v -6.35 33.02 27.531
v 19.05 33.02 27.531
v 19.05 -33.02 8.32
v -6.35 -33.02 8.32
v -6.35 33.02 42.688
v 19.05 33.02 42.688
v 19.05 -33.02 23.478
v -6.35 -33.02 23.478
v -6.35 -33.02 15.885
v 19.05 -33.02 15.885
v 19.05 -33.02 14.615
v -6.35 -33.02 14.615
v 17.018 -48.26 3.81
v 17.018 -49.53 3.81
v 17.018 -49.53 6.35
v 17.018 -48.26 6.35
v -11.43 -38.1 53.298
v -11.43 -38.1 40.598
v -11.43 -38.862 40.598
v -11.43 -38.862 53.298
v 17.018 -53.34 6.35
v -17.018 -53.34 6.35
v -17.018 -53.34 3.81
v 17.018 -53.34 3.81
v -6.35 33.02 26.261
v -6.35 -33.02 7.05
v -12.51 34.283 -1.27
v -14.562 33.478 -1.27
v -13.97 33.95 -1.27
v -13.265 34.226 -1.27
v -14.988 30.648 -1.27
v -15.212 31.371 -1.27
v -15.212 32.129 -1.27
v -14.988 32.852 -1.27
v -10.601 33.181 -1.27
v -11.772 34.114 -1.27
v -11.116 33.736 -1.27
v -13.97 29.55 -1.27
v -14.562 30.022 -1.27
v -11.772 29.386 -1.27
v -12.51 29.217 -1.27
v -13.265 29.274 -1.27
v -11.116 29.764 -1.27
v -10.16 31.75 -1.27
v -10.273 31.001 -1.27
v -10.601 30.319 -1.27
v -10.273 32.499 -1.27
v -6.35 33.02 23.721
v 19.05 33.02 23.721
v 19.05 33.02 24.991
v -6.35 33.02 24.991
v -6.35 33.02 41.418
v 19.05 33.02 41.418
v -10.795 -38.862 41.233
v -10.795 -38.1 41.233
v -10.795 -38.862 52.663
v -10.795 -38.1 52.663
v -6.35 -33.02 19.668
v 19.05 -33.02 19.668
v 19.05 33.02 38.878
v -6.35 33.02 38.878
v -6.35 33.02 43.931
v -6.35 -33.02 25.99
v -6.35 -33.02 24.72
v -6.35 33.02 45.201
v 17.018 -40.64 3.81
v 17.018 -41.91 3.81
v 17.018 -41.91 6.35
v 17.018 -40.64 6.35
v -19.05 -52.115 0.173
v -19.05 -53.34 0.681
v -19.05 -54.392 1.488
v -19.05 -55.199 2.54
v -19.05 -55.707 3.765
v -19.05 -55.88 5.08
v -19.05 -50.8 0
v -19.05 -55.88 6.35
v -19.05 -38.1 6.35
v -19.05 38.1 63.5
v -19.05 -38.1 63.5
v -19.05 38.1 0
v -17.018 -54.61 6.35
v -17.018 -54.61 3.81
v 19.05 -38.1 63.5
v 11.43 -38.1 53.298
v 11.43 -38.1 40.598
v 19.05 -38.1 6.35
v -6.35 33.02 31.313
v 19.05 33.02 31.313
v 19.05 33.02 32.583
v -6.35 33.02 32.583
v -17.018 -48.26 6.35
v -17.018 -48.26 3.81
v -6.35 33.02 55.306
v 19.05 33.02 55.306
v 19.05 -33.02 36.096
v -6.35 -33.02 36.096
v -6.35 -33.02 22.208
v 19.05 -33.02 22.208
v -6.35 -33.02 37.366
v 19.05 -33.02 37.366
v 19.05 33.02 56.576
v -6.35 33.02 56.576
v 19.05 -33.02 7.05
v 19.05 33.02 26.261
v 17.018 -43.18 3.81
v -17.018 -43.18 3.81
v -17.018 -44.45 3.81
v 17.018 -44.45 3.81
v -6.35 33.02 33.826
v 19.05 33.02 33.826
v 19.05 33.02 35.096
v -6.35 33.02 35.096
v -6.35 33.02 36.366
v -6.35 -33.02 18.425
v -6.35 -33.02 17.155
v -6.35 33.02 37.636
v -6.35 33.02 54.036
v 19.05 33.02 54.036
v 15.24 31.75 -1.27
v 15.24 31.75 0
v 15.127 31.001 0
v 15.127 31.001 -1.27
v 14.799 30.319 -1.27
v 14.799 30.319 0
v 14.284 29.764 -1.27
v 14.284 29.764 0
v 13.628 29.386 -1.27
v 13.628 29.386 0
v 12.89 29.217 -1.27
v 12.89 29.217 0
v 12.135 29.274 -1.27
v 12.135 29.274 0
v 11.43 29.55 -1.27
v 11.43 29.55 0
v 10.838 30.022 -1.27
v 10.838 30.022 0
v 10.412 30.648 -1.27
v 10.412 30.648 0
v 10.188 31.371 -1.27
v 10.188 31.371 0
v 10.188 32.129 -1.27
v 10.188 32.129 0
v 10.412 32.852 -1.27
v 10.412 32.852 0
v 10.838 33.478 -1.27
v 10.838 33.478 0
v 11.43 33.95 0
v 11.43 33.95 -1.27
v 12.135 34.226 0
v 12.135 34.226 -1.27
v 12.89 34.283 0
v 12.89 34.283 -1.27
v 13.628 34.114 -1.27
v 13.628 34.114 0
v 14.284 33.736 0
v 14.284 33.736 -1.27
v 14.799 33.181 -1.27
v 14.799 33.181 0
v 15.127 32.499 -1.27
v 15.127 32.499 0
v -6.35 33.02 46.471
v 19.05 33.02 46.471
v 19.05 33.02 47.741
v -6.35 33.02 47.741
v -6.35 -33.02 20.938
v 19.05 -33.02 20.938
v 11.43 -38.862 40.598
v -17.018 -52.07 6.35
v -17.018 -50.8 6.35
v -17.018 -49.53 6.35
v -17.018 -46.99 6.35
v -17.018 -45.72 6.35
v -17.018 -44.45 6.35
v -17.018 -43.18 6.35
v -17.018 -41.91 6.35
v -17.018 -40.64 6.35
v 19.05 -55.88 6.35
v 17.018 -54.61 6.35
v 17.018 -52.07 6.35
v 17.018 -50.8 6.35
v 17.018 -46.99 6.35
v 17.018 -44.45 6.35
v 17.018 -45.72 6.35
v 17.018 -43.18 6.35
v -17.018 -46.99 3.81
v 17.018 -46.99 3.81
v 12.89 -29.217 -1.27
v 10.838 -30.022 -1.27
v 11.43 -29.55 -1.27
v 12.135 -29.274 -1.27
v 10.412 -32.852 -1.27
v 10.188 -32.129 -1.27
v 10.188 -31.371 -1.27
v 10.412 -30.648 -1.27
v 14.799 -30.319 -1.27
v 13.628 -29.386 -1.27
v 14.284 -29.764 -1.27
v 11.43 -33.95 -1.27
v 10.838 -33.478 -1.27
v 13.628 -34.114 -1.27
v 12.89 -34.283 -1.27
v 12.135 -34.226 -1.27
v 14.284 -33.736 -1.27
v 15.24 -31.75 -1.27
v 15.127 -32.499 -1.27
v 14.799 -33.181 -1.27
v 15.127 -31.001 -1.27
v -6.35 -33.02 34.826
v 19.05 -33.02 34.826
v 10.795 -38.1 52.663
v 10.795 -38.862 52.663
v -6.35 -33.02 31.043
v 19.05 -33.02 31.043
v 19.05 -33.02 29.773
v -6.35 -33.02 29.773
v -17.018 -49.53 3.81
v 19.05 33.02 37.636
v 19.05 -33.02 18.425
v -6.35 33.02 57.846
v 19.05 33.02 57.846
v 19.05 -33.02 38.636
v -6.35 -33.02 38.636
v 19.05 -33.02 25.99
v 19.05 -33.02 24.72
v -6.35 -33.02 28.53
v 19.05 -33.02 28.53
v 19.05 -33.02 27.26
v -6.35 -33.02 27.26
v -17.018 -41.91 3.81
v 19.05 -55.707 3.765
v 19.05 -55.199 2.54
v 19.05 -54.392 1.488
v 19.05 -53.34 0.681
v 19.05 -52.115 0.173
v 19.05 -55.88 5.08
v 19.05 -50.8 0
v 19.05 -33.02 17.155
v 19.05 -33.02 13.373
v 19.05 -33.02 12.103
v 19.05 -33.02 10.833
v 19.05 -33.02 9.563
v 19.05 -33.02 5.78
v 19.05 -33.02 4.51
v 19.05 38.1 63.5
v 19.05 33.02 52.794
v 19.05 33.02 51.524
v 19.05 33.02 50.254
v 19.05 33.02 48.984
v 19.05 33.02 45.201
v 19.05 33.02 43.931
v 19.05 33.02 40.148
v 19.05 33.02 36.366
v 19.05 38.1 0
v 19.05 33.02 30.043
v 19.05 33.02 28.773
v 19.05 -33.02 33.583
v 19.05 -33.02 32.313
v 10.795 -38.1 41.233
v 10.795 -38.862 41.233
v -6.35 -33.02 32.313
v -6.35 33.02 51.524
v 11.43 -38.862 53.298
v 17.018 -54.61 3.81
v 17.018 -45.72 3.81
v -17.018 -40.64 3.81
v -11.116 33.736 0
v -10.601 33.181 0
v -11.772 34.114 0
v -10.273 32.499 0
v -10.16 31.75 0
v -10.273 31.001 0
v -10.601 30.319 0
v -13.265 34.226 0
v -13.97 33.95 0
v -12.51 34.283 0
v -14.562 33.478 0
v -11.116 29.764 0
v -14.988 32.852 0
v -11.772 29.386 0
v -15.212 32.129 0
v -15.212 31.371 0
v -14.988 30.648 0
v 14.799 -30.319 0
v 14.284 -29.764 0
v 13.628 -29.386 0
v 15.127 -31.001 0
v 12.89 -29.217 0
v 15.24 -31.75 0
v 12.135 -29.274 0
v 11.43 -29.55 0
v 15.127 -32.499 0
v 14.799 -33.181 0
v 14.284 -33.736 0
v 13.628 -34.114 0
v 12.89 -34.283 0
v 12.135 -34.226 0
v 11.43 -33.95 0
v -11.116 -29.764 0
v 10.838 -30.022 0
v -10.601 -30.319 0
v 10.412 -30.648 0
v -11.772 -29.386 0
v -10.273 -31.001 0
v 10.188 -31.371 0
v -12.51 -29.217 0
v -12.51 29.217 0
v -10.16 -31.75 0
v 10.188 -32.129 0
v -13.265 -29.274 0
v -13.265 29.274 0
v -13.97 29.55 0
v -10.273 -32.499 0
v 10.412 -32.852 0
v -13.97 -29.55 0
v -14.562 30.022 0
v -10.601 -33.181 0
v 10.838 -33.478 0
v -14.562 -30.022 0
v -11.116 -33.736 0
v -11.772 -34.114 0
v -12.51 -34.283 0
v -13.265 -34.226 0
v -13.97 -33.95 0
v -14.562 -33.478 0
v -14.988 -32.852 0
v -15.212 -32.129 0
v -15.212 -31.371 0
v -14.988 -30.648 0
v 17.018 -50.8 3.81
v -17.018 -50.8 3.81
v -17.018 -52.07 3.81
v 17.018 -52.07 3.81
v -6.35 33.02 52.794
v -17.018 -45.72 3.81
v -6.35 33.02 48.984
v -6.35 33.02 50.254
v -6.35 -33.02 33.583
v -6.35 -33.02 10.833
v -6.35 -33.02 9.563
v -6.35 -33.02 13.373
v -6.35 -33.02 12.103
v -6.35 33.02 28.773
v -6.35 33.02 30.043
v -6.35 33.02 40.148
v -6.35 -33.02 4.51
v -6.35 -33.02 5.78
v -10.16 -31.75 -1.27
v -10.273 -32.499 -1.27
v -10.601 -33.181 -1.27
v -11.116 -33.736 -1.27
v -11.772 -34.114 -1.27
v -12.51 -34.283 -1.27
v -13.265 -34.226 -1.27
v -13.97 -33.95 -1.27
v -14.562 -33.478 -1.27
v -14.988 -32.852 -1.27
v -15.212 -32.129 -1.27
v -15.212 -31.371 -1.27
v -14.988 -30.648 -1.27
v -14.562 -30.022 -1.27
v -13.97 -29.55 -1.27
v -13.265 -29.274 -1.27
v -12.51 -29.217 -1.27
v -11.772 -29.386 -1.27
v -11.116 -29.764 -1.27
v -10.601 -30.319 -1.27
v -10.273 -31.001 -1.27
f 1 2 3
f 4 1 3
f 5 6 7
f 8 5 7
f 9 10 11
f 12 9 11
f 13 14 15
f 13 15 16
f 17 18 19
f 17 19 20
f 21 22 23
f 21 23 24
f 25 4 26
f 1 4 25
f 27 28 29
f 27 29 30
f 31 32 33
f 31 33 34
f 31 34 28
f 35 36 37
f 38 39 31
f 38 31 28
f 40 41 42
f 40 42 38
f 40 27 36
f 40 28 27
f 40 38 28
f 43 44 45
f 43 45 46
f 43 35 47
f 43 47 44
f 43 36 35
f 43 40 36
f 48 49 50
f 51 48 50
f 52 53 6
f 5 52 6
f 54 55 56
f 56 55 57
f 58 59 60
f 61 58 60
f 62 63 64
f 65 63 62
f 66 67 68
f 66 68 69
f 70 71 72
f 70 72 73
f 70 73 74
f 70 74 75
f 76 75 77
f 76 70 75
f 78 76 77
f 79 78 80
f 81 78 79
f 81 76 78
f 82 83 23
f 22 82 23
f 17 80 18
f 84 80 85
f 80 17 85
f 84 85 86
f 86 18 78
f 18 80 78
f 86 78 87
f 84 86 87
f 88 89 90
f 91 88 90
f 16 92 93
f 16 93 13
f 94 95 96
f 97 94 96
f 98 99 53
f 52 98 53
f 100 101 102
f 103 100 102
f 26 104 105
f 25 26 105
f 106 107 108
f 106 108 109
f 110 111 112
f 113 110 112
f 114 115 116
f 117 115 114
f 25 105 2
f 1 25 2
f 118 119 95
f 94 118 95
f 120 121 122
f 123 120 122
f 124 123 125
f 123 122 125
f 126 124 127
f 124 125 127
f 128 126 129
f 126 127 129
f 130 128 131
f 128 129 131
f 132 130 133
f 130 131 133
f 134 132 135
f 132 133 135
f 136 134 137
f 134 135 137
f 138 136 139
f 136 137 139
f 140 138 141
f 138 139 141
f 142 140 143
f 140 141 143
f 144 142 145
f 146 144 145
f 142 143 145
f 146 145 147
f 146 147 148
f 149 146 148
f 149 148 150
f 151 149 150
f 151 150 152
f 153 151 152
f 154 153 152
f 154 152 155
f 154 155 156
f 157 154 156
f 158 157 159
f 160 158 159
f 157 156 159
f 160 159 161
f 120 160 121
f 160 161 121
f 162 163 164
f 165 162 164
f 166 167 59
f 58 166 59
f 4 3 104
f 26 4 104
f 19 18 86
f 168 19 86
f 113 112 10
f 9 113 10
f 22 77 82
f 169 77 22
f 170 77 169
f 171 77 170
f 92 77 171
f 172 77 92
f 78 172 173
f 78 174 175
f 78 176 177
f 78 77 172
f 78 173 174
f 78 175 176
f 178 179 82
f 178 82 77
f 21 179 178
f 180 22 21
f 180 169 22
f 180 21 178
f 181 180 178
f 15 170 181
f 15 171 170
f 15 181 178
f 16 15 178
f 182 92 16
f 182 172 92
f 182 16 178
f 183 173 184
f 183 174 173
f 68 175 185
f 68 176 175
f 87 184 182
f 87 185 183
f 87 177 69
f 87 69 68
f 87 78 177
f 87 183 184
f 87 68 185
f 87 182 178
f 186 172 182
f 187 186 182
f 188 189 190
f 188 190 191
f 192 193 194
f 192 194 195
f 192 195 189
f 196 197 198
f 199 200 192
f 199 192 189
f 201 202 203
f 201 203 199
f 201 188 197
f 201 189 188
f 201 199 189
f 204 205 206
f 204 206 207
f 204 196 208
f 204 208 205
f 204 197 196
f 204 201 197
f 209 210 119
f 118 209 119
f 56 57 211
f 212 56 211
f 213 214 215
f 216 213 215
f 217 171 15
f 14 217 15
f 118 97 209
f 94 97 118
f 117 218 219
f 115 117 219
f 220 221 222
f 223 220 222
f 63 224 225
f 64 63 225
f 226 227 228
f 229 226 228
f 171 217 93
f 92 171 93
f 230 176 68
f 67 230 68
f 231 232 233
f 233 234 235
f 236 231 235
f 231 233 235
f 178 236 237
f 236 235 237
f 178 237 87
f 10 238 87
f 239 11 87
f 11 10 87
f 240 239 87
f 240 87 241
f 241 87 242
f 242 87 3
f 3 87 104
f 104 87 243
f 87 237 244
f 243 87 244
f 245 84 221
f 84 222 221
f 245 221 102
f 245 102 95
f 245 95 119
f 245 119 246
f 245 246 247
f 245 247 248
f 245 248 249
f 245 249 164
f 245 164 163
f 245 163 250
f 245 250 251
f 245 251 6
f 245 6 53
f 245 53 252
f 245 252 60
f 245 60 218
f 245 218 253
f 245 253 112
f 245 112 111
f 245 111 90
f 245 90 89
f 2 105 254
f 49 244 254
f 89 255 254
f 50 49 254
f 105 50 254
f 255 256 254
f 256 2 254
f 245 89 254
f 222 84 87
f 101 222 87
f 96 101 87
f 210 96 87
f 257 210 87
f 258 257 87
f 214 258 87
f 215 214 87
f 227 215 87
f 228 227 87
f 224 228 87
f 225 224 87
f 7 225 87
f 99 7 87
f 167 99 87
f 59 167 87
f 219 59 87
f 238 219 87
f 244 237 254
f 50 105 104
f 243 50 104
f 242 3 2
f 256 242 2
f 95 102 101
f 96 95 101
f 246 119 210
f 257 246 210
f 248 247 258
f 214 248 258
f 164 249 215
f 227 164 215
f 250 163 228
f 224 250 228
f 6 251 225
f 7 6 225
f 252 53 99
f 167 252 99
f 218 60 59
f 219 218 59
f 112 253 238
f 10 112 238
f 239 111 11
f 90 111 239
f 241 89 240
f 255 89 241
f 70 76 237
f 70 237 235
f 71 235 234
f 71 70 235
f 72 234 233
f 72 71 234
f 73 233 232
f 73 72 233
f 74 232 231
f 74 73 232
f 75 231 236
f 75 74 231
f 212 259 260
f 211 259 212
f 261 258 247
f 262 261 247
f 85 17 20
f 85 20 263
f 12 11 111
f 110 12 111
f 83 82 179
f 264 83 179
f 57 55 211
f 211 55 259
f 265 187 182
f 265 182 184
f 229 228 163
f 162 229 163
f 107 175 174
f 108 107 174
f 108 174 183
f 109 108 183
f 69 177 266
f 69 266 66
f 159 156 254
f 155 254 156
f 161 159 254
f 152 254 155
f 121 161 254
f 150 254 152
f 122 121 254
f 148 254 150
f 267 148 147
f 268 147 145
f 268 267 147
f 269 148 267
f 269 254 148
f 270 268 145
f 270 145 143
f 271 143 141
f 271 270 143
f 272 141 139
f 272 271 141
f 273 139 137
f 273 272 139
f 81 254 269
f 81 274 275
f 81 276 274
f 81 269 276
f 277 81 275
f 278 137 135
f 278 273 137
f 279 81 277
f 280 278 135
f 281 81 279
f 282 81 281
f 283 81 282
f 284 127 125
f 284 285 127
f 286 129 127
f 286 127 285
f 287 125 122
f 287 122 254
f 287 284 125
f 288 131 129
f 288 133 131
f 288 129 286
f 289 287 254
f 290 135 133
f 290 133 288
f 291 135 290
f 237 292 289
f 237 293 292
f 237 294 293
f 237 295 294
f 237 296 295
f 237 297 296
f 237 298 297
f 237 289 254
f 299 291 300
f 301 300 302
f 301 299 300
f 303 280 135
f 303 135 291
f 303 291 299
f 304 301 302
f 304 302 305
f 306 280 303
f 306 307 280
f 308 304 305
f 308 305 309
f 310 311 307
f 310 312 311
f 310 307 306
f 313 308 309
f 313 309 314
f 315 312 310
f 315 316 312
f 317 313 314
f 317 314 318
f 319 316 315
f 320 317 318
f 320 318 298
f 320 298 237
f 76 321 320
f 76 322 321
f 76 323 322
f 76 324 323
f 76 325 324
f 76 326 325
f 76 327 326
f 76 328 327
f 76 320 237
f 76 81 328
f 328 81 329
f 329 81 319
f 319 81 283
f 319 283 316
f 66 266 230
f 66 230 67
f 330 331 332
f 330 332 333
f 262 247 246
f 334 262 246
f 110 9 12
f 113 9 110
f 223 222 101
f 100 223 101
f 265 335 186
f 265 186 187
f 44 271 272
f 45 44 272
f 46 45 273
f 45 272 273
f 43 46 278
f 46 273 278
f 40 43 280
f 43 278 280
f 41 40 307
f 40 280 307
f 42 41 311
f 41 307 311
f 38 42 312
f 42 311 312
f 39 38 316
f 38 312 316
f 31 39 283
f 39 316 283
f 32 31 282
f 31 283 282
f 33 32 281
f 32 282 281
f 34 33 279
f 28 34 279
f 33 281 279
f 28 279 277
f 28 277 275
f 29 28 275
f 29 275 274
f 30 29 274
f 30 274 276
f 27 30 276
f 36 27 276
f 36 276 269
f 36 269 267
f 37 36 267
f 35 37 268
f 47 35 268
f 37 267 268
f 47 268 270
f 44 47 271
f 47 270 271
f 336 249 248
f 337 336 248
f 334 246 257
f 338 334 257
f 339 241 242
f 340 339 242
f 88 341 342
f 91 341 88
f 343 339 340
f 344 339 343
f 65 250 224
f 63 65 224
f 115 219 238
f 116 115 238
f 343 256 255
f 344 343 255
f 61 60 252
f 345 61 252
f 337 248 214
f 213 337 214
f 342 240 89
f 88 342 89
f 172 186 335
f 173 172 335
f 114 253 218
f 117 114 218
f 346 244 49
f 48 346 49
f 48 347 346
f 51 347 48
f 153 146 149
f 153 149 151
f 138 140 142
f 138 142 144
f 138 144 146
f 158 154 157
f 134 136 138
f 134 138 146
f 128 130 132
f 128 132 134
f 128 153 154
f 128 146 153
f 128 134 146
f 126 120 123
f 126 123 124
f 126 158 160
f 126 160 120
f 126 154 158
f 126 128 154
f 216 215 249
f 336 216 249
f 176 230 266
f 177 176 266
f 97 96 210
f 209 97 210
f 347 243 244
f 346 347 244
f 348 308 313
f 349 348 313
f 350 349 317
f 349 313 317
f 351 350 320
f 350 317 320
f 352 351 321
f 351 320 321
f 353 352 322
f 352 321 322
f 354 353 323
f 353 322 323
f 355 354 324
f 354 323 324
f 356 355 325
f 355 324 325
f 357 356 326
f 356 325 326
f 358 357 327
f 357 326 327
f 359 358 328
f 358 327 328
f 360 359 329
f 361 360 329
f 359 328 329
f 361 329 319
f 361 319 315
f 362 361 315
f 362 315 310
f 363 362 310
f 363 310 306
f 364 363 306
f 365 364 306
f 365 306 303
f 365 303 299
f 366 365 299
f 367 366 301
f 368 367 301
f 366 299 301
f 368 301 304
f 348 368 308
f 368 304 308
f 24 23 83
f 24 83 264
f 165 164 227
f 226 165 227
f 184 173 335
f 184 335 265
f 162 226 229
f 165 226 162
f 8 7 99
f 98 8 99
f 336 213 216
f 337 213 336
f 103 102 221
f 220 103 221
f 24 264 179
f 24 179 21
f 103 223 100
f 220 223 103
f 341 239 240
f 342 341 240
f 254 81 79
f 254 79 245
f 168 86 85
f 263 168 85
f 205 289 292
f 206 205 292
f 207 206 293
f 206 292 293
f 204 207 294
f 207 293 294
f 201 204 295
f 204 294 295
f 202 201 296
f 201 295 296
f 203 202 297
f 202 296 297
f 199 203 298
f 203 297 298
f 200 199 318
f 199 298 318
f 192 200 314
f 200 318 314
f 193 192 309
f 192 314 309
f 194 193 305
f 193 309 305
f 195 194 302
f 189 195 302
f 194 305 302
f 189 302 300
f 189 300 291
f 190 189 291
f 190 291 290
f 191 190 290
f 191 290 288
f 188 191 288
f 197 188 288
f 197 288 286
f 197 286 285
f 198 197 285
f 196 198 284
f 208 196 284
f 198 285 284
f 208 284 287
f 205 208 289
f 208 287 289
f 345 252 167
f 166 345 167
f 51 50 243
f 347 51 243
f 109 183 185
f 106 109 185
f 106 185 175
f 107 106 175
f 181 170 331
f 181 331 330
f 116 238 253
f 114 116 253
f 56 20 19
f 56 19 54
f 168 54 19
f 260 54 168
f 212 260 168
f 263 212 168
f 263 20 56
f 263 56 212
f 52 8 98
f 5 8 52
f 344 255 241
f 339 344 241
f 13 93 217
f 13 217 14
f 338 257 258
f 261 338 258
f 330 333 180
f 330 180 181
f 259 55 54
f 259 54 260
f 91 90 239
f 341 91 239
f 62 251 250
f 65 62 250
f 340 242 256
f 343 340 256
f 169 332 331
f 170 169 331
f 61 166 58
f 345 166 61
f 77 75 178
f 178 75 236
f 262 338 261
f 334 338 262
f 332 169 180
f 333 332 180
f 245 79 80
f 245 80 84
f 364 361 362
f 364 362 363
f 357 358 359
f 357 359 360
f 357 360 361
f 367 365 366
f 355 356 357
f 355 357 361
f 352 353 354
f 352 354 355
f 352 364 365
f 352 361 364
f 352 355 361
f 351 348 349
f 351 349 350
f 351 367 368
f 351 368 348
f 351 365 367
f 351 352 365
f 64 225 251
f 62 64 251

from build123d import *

# Parameters (mm, degrees)
F0_W      = 38.1
F0_H      = 76.2
F1_DEPTH  = 63.5
F3_R      = 2.54
F4_DEPTH  = 1.27
F6_DEPTH  = 25.4
F8_DEPTH  = 38.1
F9_W      = 38.1
F9_H      = 17.78
F10_DEPTH = 1.27
F11_W     = 34.036
F11_H     = 1.27
F12_DEPTH = 2.54
F2_W      = 22.86
F2_H      = 12.7
F2_W_2    = 21.59
F2_H_2    = 11.43
F13_DEPTH = 0.762


with BuildPart() as f1:
    # F0 (on Top) → F1 (new body)
    with BuildSketch(Plane.XY):
        Rectangle(F0_W, F0_H)
    extrude(amount=F1_DEPTH)

    # F3 (on face) → F4 (join)
    with BuildSketch(Plane(origin=(0, 0, 0), x_dir=(1, 0, 0), z_dir=(0, 0, -1))):
        with Locations((-12.7, 31.75)):
            Circle(F3_R)
        with Locations((12.7, 31.75)):
            Circle(F3_R)
        with Locations((-12.7, -31.75)):
            Circle(F3_R)
        with Locations((12.7, -31.75)):
            Circle(F3_R)
    extrude(amount=F4_DEPTH)

    # F5 (on face) → F6 (cut)
    with BuildSketch(Plane.YZ.offset(19.05)):
        Polygon((33.02, 57.846099), (-33.02, 38.635515), (-33.02, 37.365515), (33.02, 56.576099), align=None)
        Polygon((-33.02, 25.990401), (-33.02, 24.720401), (33.02, 43.930985), (33.02, 45.200985), align=None)
        Polygon((-33.02, 28.530401), (-33.02, 27.260401), (33.02, 46.470985), (33.02, 47.740985), align=None)
        Polygon((-33.02, 31.042958), (-33.02, 29.772958), (33.02, 48.983542), (33.02, 50.253542), align=None)
        Polygon((-33.02, 33.582958), (-33.02, 32.312958), (33.02, 51.523542), (33.02, 52.793542), align=None)
        Polygon((-33.02, 36.095515), (-33.02, 34.825515), (33.02, 54.036099), (33.02, 55.306099), align=None)
        Polygon((33.02, 42.688428), (-33.02, 23.477843), (-33.02, 22.207843), (33.02, 41.418428), align=None)
        Polygon((-33.02, 20.937843), (-33.02, 19.667843), (33.02, 38.878428), (33.02, 40.148428), align=None)
        Polygon((-33.02, 15.885286), (-33.02, 14.615286), (33.02, 33.825871), (33.02, 35.095871), align=None)
        Polygon((-33.02, 18.425286), (-33.02, 17.155286), (33.02, 36.365871), (33.02, 37.635871), align=None)
        Polygon((-33.02, 10.832729), (-33.02, 9.562729), (33.02, 28.773313), (33.02, 30.043313), align=None)
        Polygon((-33.02, 13.372729), (-33.02, 12.102729), (33.02, 31.313313), (33.02, 32.583313), align=None)
        Polygon((-33.02, 5.780172), (-33.02, 4.510172), (33.02, 23.720756), (33.02, 24.990756), align=None)
        Polygon((-33.02, 8.320172), (-33.02, 7.050172), (33.02, 26.260756), (33.02, 27.530756), align=None)
    extrude(amount=-F6_DEPTH, mode=Mode.SUBTRACT)

    # F7 (on face) → F8 (join)
    with BuildSketch(Plane(origin=(-19.05, 0, 0), x_dir=(0, -1, 0), z_dir=(-1, 0, 0))):
        with BuildLine():
            Line((38.1, 5.08), (38.1, 0))
            Line((38.1, 0), (50.8, 0))
            ThreePointArc((50.8, 0), (54.392102, 1.487898), (55.88, 5.08))
            Line((55.88, 5.08), (50.8, 5.08))
            Line((50.8, 5.08), (38.1, 5.08))
        make_face()
    extrude(amount=-F8_DEPTH)

    # F9 (on face) → F10 (join)
    with BuildSketch(Plane.XY.offset(5.08)):
        with Locations((0, -46.99)):
            Rectangle(F9_W, F9_H)
    extrude(amount=F10_DEPTH)

    # F11 (on face) → F12 (cut)
    with BuildSketch(Plane.XY.offset(6.35)):
        with Locations((0, -41.275)):
            Rectangle(F11_W, F11_H)
        Polygon((17.018, -43.269459), (17.018, -43.18), (-17.018, -43.18), (-17.018, -44.45), (17.018, -44.45), align=None)
        with Locations((0, -46.355)):
            Rectangle(F11_W, F11_H)
        with Locations((0, -48.895)):
            Rectangle(F11_W, F11_H)
        with Locations((0, -51.435)):
            Rectangle(F11_W, F11_H)
        with Locations((0, -53.975)):
            Rectangle(F11_W, F11_H)
    extrude(amount=-F12_DEPTH, mode=Mode.SUBTRACT)

    # F2 (on face) → F13 (join)
    with BuildSketch(Plane.XZ.offset(38.1)):
        with Locations((0, 46.947837)):
            Rectangle(F2_W, F2_H)
        with Locations((0, 46.947837)):
            Rectangle(F2_W_2, F2_H_2, mode=Mode.SUBTRACT)
    extrude(amount=F13_DEPTH)


solid = f1.part
